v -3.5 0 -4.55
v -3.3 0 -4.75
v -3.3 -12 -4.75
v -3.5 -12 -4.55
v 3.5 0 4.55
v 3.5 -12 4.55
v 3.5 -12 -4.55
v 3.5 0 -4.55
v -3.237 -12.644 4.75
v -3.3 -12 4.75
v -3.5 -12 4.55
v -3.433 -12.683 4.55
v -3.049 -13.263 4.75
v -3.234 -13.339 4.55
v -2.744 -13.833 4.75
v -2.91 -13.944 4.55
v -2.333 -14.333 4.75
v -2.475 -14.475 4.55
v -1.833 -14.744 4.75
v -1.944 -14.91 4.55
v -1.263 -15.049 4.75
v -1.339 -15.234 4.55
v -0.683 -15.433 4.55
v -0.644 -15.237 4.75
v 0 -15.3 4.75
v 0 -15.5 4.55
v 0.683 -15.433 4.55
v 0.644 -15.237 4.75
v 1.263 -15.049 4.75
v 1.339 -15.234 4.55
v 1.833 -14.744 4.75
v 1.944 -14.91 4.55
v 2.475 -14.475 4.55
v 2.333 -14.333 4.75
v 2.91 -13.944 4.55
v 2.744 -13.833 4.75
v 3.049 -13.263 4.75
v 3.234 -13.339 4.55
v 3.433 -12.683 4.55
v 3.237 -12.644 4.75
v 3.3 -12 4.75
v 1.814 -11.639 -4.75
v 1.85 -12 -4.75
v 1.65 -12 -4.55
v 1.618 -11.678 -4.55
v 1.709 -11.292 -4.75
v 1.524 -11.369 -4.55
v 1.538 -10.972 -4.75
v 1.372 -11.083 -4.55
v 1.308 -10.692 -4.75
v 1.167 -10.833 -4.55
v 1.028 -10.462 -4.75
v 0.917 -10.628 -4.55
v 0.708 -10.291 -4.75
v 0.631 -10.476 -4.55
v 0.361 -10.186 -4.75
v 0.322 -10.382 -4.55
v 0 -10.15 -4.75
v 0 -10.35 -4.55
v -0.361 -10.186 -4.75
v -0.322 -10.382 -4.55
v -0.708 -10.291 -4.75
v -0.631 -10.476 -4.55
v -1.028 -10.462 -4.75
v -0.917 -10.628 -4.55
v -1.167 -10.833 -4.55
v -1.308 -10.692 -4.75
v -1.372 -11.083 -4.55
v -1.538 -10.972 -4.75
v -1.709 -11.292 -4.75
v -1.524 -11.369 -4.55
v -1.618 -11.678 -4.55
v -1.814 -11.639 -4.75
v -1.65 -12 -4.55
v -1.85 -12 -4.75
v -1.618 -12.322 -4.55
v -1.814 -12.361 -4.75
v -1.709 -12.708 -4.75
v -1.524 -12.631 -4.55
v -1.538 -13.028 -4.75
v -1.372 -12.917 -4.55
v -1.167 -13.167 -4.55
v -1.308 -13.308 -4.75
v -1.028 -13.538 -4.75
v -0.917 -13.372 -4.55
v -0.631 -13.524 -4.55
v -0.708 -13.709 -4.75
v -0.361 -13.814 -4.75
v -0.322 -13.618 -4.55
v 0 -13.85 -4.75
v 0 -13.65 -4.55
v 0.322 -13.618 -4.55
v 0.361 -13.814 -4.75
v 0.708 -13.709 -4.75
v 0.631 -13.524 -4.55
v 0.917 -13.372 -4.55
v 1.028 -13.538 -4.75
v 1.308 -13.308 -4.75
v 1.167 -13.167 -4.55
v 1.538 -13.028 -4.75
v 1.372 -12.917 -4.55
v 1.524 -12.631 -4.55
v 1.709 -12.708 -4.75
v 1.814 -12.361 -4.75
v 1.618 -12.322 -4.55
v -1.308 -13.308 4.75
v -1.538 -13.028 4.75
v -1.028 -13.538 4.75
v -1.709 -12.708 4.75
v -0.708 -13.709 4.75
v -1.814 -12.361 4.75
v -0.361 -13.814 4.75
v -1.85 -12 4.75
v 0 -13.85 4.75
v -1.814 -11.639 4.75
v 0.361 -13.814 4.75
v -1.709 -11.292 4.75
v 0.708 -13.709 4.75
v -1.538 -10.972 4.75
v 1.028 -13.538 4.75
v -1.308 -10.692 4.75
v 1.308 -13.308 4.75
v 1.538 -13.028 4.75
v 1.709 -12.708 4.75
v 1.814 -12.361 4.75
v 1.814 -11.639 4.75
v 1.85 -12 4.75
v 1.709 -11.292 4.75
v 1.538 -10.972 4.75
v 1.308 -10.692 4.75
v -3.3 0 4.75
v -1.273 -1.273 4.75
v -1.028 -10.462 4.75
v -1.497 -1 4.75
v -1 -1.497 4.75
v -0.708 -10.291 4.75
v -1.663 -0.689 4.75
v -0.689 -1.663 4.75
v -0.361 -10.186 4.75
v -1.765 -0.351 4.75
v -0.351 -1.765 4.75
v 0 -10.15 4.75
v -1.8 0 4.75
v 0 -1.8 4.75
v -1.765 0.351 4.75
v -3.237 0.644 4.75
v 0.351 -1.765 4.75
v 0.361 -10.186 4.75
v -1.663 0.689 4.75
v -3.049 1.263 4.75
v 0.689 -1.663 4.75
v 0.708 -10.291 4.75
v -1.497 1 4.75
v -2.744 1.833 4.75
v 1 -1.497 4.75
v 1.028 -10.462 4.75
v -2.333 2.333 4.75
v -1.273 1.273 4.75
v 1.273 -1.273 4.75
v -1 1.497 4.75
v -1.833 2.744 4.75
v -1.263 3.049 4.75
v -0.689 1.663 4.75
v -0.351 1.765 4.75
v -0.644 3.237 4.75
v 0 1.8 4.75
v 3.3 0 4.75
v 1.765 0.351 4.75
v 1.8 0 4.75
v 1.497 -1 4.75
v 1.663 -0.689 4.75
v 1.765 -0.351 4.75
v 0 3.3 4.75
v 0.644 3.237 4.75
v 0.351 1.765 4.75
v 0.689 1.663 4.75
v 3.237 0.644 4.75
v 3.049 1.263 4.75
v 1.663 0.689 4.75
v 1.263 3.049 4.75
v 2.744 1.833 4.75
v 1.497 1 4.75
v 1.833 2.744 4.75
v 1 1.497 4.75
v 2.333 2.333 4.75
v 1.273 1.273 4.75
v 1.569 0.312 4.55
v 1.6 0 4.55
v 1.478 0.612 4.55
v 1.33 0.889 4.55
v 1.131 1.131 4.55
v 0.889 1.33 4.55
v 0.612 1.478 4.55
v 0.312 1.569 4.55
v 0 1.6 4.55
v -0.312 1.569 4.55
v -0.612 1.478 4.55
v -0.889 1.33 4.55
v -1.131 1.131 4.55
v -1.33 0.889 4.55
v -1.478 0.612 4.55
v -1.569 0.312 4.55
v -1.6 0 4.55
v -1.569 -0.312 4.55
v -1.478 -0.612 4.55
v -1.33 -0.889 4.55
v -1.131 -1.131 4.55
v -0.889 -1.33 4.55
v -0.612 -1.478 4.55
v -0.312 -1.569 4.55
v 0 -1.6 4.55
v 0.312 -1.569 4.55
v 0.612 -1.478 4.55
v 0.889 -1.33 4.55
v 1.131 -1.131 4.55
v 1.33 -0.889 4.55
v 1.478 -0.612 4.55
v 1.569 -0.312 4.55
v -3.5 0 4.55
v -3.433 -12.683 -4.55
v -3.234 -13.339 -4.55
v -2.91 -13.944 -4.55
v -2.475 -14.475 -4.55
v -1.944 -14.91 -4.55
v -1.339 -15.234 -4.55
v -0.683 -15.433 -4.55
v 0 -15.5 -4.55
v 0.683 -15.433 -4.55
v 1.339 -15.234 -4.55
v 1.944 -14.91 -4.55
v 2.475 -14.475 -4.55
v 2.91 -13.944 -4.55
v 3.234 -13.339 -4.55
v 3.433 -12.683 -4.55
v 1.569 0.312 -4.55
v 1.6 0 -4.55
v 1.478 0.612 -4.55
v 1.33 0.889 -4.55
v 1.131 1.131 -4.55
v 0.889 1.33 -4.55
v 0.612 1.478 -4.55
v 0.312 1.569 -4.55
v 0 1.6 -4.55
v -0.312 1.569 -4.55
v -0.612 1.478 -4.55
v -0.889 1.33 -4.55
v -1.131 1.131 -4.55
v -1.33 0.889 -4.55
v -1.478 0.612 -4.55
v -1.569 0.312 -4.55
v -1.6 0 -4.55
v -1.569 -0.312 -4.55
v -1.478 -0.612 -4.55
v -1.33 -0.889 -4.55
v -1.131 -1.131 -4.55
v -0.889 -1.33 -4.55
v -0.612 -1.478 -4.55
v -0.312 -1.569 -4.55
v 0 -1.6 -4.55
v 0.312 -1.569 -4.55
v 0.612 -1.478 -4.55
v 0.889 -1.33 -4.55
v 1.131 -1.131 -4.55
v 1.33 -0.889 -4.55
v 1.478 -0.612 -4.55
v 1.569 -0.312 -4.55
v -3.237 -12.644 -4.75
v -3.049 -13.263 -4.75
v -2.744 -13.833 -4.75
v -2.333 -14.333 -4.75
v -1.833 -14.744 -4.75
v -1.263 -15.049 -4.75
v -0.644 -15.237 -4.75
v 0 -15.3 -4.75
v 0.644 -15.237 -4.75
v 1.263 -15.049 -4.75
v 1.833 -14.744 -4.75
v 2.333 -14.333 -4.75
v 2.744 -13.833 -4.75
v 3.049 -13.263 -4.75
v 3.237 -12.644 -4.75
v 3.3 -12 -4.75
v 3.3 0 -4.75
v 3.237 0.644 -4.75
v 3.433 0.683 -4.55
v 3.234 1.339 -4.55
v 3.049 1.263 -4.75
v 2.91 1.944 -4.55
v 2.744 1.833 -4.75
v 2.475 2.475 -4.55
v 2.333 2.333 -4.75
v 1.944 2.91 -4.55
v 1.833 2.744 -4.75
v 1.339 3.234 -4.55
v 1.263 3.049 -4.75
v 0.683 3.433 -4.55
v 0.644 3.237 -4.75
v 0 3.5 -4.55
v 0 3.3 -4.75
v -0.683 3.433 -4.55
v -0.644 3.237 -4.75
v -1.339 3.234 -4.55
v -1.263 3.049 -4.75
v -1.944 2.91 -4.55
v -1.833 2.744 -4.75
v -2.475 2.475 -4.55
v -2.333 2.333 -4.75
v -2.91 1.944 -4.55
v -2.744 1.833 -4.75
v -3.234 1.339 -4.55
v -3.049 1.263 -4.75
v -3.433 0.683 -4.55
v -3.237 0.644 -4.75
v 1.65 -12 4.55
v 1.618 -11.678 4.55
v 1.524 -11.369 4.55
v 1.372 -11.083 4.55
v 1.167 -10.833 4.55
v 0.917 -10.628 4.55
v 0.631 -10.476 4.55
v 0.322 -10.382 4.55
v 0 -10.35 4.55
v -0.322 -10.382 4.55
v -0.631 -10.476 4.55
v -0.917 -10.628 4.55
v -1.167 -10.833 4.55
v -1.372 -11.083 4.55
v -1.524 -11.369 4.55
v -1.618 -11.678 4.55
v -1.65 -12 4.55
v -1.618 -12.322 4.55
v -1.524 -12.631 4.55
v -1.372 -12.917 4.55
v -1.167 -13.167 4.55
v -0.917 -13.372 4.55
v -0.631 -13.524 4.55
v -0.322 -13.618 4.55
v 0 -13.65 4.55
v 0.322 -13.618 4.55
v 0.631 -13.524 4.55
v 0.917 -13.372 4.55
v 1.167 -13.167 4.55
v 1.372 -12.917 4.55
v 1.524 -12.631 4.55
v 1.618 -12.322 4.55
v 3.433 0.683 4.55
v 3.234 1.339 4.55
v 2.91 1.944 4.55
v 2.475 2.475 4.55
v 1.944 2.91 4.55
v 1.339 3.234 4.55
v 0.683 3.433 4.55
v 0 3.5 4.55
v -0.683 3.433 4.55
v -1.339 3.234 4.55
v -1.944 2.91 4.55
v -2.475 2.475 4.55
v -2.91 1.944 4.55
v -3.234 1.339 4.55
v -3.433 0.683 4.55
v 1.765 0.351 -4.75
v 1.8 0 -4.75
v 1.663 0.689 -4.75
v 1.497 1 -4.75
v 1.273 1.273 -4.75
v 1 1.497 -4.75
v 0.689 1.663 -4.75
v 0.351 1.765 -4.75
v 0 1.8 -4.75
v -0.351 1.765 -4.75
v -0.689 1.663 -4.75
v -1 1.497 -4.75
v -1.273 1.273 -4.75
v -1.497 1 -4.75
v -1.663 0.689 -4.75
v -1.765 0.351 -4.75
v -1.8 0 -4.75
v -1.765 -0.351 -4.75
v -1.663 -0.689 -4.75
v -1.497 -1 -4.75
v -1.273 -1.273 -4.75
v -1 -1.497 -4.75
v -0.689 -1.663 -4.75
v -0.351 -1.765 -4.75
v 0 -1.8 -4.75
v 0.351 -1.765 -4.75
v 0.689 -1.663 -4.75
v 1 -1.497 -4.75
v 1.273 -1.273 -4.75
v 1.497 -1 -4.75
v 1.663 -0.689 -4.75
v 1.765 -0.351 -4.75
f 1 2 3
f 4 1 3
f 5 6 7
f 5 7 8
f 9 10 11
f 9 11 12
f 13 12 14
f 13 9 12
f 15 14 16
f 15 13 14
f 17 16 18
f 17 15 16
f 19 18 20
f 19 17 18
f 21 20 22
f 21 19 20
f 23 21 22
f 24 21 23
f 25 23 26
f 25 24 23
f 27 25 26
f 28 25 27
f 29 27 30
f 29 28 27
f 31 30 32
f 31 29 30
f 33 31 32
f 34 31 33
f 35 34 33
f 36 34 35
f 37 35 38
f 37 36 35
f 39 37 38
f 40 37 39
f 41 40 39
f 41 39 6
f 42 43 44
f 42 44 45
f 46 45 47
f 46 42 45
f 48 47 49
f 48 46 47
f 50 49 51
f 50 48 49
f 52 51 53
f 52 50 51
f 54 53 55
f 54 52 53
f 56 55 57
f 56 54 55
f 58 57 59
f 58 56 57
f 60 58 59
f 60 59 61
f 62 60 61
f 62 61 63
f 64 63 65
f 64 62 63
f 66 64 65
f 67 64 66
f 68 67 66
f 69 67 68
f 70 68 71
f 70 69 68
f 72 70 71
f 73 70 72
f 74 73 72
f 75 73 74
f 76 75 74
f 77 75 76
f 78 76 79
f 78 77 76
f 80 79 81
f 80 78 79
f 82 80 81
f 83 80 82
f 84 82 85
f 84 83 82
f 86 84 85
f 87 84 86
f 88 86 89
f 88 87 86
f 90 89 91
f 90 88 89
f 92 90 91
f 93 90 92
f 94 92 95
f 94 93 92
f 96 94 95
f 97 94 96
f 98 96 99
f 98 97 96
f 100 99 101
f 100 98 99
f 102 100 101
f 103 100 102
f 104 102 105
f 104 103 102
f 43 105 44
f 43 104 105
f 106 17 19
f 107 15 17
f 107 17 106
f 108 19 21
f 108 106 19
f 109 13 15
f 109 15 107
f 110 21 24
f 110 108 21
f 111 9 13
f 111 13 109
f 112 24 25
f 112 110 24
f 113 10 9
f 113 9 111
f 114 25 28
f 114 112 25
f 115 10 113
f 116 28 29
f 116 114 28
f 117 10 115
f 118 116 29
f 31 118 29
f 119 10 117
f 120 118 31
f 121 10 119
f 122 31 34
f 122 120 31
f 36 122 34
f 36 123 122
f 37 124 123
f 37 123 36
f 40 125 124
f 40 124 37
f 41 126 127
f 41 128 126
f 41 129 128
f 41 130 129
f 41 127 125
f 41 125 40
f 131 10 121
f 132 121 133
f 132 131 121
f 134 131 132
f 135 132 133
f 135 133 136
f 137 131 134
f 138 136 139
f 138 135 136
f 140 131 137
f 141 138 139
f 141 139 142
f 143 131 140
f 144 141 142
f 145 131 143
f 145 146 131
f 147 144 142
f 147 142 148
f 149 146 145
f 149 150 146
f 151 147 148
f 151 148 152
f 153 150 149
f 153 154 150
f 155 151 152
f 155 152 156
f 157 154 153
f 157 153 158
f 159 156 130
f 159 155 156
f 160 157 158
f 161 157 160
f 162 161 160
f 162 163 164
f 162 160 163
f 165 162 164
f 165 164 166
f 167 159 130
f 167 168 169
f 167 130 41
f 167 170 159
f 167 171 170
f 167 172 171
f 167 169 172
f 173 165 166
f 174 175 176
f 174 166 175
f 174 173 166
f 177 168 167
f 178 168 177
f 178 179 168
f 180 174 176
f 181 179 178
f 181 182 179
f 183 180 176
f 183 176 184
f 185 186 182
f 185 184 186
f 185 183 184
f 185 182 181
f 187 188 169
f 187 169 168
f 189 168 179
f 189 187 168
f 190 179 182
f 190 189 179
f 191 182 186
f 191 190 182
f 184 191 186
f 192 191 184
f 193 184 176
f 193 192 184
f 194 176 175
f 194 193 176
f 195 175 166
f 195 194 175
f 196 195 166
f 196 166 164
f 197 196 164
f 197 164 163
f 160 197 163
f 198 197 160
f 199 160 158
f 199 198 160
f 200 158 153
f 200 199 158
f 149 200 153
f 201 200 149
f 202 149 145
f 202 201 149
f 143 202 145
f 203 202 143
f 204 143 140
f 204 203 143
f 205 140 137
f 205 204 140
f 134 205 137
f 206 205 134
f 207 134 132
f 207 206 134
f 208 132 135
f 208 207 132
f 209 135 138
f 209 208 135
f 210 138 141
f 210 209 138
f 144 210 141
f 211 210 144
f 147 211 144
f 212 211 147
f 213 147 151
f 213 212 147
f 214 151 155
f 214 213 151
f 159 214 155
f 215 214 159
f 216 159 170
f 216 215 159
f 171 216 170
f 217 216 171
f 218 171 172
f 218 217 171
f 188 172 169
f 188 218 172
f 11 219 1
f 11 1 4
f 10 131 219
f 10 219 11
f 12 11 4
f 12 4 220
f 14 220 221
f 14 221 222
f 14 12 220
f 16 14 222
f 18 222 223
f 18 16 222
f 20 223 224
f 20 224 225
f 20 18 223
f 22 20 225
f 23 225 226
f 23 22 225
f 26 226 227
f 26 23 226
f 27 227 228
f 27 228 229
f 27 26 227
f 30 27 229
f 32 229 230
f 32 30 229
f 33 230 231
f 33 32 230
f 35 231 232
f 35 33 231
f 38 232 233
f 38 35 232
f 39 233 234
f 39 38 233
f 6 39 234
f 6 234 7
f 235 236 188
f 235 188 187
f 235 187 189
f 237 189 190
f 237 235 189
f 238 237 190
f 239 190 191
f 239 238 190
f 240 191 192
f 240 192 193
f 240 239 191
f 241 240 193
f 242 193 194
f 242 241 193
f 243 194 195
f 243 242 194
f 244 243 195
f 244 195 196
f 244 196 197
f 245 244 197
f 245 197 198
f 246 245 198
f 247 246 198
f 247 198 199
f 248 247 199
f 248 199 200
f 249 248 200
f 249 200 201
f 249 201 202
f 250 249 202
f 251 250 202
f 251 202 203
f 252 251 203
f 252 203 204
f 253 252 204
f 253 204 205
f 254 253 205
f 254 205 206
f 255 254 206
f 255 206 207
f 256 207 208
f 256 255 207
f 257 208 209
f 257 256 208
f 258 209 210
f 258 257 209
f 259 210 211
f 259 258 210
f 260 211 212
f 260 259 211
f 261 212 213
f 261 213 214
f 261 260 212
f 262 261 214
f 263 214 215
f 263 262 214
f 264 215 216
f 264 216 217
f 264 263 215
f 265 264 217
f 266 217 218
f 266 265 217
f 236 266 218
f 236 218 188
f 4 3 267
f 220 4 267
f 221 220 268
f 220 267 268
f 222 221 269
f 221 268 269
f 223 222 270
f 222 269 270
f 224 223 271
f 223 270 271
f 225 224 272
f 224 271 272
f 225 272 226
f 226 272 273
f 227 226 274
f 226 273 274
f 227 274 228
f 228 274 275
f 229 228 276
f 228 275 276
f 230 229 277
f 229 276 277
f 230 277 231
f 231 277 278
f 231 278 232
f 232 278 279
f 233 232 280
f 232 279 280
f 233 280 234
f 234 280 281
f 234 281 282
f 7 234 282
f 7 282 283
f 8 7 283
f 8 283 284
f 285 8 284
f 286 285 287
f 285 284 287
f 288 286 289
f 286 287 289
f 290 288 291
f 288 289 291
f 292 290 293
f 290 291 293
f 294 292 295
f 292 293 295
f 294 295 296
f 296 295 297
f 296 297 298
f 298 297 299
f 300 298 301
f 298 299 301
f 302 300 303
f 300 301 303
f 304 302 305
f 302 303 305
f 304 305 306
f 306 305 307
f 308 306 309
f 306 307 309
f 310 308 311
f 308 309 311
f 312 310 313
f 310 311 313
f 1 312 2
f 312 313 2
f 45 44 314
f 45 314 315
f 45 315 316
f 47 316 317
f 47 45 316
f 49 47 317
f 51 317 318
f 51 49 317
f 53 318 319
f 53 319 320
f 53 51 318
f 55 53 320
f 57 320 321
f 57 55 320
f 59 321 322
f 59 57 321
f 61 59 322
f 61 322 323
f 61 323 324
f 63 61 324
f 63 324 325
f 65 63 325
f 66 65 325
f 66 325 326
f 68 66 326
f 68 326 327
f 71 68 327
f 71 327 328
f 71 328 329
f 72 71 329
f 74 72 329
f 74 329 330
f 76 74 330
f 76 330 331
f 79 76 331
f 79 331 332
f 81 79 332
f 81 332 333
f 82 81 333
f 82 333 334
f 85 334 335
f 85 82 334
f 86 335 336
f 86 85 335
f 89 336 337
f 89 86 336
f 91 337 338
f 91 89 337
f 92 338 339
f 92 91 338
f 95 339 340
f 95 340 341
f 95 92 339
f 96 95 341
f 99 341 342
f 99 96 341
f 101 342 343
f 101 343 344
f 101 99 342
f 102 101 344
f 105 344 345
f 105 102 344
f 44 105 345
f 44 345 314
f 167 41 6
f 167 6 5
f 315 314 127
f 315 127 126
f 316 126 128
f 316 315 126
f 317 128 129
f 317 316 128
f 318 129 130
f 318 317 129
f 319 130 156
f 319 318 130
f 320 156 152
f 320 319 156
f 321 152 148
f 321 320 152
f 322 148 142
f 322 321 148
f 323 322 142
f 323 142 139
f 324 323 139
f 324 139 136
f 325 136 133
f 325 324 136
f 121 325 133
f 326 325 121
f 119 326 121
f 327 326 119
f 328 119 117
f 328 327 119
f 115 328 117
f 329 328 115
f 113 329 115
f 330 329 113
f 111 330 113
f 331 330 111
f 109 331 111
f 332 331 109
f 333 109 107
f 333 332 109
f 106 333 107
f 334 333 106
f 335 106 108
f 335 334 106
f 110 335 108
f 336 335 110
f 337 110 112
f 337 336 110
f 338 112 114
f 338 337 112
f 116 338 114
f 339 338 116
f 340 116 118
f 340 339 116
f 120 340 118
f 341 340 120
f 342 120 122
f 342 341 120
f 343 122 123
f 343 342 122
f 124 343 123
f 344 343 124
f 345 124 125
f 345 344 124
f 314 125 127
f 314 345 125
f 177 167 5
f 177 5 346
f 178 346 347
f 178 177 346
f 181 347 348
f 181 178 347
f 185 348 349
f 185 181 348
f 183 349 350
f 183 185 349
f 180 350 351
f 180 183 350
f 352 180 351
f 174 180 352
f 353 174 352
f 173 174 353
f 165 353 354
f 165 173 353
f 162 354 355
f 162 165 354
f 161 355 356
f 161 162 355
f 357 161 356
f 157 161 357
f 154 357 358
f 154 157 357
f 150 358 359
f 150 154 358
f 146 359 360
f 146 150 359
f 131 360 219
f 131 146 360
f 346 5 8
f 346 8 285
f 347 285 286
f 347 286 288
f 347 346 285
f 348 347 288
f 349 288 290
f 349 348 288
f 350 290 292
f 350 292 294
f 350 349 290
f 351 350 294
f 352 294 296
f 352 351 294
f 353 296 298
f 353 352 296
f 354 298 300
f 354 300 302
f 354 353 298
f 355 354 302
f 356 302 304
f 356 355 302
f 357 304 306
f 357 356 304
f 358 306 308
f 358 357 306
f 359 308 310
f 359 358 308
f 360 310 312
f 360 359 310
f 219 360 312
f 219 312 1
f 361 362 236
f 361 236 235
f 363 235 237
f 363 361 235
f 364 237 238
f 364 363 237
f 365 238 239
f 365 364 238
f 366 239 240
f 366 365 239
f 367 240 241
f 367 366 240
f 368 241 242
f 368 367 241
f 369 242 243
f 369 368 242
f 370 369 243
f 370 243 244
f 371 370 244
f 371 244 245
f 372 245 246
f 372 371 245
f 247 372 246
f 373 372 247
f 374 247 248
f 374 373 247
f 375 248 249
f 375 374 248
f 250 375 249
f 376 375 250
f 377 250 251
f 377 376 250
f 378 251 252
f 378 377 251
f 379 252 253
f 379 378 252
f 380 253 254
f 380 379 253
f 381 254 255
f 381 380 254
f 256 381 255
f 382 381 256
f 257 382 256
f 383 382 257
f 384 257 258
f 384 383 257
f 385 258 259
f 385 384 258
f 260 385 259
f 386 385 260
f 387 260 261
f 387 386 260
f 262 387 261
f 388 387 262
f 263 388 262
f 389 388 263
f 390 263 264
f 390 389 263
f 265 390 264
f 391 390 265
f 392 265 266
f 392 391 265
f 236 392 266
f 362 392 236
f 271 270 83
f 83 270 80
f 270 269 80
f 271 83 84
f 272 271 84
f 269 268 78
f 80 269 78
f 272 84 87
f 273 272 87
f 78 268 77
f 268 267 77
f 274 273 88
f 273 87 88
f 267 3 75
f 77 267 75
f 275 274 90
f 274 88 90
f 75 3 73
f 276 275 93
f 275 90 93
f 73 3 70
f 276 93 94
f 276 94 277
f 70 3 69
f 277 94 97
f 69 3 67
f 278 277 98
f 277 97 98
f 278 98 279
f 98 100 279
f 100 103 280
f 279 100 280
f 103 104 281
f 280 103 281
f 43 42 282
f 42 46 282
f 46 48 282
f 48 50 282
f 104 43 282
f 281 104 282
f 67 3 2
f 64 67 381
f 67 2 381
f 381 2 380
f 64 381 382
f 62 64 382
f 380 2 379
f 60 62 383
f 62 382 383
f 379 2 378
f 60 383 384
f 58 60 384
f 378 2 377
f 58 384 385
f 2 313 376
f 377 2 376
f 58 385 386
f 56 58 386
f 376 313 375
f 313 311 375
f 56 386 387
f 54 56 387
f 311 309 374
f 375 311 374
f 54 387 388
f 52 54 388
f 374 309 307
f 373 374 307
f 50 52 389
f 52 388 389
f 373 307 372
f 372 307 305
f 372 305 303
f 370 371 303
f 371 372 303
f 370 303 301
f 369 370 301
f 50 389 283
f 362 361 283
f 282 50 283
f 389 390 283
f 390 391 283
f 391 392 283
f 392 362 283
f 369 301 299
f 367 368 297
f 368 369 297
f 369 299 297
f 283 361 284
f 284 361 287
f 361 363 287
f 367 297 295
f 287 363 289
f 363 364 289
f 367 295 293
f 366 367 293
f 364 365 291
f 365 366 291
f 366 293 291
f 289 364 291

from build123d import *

# Parameters (mm, degrees)
SKETCH1_R             = 1.6
SKETCH1_R_2           = 1.65
BOSS_EXTRUDE1_DEPTH   = 4.75
DEBURS_NO_SPRING_SIZE = 0.2


with BuildPart() as part:
    # Sketch1 → Boss-Extrude1 (new, symmetric)
    with BuildSketch(Plane.XY):
        with BuildLine():
            Line((-3.5, 0), (-3.5, -12))
            ThreePointArc((-3.5, -12), (0, -15.5), (3.5, -12))
            Line((3.5, -12), (3.5, 0))
            ThreePointArc((3.5, 0), (0, 3.5), (-3.5, 0))
        make_face()
        Circle(SKETCH1_R, mode=Mode.SUBTRACT)
        with Locations((0, -12)):
            Circle(SKETCH1_R_2, mode=Mode.SUBTRACT)
    extrude(amount=BOSS_EXTRUDE1_DEPTH, both=True)

    # Deburs no Spring
    deburs_no_spring_edges = [part.edges().sort_by_distance(p)[0] for p in [
        (-1.65, -12, -4.75),
        (-1.6, 0, -4.75),
        (-1.65, -12, 4.75),
        (-3.5, -6, 4.75),
        (0, -15.5, 4.75),
        (3.5, -6, 4.75),
        (0, 3.5, 4.75),
        (-1.6, 0, 4.75),
        (0, 3.5, -4.75),
        (3.5, -6, -4.75),
        (0, -15.5, -4.75),
        (-3.5, -6, -4.75),
    ]]
    chamfer(deburs_no_spring_edges, length=DEBURS_NO_SPRING_SIZE)


solid = part.part
